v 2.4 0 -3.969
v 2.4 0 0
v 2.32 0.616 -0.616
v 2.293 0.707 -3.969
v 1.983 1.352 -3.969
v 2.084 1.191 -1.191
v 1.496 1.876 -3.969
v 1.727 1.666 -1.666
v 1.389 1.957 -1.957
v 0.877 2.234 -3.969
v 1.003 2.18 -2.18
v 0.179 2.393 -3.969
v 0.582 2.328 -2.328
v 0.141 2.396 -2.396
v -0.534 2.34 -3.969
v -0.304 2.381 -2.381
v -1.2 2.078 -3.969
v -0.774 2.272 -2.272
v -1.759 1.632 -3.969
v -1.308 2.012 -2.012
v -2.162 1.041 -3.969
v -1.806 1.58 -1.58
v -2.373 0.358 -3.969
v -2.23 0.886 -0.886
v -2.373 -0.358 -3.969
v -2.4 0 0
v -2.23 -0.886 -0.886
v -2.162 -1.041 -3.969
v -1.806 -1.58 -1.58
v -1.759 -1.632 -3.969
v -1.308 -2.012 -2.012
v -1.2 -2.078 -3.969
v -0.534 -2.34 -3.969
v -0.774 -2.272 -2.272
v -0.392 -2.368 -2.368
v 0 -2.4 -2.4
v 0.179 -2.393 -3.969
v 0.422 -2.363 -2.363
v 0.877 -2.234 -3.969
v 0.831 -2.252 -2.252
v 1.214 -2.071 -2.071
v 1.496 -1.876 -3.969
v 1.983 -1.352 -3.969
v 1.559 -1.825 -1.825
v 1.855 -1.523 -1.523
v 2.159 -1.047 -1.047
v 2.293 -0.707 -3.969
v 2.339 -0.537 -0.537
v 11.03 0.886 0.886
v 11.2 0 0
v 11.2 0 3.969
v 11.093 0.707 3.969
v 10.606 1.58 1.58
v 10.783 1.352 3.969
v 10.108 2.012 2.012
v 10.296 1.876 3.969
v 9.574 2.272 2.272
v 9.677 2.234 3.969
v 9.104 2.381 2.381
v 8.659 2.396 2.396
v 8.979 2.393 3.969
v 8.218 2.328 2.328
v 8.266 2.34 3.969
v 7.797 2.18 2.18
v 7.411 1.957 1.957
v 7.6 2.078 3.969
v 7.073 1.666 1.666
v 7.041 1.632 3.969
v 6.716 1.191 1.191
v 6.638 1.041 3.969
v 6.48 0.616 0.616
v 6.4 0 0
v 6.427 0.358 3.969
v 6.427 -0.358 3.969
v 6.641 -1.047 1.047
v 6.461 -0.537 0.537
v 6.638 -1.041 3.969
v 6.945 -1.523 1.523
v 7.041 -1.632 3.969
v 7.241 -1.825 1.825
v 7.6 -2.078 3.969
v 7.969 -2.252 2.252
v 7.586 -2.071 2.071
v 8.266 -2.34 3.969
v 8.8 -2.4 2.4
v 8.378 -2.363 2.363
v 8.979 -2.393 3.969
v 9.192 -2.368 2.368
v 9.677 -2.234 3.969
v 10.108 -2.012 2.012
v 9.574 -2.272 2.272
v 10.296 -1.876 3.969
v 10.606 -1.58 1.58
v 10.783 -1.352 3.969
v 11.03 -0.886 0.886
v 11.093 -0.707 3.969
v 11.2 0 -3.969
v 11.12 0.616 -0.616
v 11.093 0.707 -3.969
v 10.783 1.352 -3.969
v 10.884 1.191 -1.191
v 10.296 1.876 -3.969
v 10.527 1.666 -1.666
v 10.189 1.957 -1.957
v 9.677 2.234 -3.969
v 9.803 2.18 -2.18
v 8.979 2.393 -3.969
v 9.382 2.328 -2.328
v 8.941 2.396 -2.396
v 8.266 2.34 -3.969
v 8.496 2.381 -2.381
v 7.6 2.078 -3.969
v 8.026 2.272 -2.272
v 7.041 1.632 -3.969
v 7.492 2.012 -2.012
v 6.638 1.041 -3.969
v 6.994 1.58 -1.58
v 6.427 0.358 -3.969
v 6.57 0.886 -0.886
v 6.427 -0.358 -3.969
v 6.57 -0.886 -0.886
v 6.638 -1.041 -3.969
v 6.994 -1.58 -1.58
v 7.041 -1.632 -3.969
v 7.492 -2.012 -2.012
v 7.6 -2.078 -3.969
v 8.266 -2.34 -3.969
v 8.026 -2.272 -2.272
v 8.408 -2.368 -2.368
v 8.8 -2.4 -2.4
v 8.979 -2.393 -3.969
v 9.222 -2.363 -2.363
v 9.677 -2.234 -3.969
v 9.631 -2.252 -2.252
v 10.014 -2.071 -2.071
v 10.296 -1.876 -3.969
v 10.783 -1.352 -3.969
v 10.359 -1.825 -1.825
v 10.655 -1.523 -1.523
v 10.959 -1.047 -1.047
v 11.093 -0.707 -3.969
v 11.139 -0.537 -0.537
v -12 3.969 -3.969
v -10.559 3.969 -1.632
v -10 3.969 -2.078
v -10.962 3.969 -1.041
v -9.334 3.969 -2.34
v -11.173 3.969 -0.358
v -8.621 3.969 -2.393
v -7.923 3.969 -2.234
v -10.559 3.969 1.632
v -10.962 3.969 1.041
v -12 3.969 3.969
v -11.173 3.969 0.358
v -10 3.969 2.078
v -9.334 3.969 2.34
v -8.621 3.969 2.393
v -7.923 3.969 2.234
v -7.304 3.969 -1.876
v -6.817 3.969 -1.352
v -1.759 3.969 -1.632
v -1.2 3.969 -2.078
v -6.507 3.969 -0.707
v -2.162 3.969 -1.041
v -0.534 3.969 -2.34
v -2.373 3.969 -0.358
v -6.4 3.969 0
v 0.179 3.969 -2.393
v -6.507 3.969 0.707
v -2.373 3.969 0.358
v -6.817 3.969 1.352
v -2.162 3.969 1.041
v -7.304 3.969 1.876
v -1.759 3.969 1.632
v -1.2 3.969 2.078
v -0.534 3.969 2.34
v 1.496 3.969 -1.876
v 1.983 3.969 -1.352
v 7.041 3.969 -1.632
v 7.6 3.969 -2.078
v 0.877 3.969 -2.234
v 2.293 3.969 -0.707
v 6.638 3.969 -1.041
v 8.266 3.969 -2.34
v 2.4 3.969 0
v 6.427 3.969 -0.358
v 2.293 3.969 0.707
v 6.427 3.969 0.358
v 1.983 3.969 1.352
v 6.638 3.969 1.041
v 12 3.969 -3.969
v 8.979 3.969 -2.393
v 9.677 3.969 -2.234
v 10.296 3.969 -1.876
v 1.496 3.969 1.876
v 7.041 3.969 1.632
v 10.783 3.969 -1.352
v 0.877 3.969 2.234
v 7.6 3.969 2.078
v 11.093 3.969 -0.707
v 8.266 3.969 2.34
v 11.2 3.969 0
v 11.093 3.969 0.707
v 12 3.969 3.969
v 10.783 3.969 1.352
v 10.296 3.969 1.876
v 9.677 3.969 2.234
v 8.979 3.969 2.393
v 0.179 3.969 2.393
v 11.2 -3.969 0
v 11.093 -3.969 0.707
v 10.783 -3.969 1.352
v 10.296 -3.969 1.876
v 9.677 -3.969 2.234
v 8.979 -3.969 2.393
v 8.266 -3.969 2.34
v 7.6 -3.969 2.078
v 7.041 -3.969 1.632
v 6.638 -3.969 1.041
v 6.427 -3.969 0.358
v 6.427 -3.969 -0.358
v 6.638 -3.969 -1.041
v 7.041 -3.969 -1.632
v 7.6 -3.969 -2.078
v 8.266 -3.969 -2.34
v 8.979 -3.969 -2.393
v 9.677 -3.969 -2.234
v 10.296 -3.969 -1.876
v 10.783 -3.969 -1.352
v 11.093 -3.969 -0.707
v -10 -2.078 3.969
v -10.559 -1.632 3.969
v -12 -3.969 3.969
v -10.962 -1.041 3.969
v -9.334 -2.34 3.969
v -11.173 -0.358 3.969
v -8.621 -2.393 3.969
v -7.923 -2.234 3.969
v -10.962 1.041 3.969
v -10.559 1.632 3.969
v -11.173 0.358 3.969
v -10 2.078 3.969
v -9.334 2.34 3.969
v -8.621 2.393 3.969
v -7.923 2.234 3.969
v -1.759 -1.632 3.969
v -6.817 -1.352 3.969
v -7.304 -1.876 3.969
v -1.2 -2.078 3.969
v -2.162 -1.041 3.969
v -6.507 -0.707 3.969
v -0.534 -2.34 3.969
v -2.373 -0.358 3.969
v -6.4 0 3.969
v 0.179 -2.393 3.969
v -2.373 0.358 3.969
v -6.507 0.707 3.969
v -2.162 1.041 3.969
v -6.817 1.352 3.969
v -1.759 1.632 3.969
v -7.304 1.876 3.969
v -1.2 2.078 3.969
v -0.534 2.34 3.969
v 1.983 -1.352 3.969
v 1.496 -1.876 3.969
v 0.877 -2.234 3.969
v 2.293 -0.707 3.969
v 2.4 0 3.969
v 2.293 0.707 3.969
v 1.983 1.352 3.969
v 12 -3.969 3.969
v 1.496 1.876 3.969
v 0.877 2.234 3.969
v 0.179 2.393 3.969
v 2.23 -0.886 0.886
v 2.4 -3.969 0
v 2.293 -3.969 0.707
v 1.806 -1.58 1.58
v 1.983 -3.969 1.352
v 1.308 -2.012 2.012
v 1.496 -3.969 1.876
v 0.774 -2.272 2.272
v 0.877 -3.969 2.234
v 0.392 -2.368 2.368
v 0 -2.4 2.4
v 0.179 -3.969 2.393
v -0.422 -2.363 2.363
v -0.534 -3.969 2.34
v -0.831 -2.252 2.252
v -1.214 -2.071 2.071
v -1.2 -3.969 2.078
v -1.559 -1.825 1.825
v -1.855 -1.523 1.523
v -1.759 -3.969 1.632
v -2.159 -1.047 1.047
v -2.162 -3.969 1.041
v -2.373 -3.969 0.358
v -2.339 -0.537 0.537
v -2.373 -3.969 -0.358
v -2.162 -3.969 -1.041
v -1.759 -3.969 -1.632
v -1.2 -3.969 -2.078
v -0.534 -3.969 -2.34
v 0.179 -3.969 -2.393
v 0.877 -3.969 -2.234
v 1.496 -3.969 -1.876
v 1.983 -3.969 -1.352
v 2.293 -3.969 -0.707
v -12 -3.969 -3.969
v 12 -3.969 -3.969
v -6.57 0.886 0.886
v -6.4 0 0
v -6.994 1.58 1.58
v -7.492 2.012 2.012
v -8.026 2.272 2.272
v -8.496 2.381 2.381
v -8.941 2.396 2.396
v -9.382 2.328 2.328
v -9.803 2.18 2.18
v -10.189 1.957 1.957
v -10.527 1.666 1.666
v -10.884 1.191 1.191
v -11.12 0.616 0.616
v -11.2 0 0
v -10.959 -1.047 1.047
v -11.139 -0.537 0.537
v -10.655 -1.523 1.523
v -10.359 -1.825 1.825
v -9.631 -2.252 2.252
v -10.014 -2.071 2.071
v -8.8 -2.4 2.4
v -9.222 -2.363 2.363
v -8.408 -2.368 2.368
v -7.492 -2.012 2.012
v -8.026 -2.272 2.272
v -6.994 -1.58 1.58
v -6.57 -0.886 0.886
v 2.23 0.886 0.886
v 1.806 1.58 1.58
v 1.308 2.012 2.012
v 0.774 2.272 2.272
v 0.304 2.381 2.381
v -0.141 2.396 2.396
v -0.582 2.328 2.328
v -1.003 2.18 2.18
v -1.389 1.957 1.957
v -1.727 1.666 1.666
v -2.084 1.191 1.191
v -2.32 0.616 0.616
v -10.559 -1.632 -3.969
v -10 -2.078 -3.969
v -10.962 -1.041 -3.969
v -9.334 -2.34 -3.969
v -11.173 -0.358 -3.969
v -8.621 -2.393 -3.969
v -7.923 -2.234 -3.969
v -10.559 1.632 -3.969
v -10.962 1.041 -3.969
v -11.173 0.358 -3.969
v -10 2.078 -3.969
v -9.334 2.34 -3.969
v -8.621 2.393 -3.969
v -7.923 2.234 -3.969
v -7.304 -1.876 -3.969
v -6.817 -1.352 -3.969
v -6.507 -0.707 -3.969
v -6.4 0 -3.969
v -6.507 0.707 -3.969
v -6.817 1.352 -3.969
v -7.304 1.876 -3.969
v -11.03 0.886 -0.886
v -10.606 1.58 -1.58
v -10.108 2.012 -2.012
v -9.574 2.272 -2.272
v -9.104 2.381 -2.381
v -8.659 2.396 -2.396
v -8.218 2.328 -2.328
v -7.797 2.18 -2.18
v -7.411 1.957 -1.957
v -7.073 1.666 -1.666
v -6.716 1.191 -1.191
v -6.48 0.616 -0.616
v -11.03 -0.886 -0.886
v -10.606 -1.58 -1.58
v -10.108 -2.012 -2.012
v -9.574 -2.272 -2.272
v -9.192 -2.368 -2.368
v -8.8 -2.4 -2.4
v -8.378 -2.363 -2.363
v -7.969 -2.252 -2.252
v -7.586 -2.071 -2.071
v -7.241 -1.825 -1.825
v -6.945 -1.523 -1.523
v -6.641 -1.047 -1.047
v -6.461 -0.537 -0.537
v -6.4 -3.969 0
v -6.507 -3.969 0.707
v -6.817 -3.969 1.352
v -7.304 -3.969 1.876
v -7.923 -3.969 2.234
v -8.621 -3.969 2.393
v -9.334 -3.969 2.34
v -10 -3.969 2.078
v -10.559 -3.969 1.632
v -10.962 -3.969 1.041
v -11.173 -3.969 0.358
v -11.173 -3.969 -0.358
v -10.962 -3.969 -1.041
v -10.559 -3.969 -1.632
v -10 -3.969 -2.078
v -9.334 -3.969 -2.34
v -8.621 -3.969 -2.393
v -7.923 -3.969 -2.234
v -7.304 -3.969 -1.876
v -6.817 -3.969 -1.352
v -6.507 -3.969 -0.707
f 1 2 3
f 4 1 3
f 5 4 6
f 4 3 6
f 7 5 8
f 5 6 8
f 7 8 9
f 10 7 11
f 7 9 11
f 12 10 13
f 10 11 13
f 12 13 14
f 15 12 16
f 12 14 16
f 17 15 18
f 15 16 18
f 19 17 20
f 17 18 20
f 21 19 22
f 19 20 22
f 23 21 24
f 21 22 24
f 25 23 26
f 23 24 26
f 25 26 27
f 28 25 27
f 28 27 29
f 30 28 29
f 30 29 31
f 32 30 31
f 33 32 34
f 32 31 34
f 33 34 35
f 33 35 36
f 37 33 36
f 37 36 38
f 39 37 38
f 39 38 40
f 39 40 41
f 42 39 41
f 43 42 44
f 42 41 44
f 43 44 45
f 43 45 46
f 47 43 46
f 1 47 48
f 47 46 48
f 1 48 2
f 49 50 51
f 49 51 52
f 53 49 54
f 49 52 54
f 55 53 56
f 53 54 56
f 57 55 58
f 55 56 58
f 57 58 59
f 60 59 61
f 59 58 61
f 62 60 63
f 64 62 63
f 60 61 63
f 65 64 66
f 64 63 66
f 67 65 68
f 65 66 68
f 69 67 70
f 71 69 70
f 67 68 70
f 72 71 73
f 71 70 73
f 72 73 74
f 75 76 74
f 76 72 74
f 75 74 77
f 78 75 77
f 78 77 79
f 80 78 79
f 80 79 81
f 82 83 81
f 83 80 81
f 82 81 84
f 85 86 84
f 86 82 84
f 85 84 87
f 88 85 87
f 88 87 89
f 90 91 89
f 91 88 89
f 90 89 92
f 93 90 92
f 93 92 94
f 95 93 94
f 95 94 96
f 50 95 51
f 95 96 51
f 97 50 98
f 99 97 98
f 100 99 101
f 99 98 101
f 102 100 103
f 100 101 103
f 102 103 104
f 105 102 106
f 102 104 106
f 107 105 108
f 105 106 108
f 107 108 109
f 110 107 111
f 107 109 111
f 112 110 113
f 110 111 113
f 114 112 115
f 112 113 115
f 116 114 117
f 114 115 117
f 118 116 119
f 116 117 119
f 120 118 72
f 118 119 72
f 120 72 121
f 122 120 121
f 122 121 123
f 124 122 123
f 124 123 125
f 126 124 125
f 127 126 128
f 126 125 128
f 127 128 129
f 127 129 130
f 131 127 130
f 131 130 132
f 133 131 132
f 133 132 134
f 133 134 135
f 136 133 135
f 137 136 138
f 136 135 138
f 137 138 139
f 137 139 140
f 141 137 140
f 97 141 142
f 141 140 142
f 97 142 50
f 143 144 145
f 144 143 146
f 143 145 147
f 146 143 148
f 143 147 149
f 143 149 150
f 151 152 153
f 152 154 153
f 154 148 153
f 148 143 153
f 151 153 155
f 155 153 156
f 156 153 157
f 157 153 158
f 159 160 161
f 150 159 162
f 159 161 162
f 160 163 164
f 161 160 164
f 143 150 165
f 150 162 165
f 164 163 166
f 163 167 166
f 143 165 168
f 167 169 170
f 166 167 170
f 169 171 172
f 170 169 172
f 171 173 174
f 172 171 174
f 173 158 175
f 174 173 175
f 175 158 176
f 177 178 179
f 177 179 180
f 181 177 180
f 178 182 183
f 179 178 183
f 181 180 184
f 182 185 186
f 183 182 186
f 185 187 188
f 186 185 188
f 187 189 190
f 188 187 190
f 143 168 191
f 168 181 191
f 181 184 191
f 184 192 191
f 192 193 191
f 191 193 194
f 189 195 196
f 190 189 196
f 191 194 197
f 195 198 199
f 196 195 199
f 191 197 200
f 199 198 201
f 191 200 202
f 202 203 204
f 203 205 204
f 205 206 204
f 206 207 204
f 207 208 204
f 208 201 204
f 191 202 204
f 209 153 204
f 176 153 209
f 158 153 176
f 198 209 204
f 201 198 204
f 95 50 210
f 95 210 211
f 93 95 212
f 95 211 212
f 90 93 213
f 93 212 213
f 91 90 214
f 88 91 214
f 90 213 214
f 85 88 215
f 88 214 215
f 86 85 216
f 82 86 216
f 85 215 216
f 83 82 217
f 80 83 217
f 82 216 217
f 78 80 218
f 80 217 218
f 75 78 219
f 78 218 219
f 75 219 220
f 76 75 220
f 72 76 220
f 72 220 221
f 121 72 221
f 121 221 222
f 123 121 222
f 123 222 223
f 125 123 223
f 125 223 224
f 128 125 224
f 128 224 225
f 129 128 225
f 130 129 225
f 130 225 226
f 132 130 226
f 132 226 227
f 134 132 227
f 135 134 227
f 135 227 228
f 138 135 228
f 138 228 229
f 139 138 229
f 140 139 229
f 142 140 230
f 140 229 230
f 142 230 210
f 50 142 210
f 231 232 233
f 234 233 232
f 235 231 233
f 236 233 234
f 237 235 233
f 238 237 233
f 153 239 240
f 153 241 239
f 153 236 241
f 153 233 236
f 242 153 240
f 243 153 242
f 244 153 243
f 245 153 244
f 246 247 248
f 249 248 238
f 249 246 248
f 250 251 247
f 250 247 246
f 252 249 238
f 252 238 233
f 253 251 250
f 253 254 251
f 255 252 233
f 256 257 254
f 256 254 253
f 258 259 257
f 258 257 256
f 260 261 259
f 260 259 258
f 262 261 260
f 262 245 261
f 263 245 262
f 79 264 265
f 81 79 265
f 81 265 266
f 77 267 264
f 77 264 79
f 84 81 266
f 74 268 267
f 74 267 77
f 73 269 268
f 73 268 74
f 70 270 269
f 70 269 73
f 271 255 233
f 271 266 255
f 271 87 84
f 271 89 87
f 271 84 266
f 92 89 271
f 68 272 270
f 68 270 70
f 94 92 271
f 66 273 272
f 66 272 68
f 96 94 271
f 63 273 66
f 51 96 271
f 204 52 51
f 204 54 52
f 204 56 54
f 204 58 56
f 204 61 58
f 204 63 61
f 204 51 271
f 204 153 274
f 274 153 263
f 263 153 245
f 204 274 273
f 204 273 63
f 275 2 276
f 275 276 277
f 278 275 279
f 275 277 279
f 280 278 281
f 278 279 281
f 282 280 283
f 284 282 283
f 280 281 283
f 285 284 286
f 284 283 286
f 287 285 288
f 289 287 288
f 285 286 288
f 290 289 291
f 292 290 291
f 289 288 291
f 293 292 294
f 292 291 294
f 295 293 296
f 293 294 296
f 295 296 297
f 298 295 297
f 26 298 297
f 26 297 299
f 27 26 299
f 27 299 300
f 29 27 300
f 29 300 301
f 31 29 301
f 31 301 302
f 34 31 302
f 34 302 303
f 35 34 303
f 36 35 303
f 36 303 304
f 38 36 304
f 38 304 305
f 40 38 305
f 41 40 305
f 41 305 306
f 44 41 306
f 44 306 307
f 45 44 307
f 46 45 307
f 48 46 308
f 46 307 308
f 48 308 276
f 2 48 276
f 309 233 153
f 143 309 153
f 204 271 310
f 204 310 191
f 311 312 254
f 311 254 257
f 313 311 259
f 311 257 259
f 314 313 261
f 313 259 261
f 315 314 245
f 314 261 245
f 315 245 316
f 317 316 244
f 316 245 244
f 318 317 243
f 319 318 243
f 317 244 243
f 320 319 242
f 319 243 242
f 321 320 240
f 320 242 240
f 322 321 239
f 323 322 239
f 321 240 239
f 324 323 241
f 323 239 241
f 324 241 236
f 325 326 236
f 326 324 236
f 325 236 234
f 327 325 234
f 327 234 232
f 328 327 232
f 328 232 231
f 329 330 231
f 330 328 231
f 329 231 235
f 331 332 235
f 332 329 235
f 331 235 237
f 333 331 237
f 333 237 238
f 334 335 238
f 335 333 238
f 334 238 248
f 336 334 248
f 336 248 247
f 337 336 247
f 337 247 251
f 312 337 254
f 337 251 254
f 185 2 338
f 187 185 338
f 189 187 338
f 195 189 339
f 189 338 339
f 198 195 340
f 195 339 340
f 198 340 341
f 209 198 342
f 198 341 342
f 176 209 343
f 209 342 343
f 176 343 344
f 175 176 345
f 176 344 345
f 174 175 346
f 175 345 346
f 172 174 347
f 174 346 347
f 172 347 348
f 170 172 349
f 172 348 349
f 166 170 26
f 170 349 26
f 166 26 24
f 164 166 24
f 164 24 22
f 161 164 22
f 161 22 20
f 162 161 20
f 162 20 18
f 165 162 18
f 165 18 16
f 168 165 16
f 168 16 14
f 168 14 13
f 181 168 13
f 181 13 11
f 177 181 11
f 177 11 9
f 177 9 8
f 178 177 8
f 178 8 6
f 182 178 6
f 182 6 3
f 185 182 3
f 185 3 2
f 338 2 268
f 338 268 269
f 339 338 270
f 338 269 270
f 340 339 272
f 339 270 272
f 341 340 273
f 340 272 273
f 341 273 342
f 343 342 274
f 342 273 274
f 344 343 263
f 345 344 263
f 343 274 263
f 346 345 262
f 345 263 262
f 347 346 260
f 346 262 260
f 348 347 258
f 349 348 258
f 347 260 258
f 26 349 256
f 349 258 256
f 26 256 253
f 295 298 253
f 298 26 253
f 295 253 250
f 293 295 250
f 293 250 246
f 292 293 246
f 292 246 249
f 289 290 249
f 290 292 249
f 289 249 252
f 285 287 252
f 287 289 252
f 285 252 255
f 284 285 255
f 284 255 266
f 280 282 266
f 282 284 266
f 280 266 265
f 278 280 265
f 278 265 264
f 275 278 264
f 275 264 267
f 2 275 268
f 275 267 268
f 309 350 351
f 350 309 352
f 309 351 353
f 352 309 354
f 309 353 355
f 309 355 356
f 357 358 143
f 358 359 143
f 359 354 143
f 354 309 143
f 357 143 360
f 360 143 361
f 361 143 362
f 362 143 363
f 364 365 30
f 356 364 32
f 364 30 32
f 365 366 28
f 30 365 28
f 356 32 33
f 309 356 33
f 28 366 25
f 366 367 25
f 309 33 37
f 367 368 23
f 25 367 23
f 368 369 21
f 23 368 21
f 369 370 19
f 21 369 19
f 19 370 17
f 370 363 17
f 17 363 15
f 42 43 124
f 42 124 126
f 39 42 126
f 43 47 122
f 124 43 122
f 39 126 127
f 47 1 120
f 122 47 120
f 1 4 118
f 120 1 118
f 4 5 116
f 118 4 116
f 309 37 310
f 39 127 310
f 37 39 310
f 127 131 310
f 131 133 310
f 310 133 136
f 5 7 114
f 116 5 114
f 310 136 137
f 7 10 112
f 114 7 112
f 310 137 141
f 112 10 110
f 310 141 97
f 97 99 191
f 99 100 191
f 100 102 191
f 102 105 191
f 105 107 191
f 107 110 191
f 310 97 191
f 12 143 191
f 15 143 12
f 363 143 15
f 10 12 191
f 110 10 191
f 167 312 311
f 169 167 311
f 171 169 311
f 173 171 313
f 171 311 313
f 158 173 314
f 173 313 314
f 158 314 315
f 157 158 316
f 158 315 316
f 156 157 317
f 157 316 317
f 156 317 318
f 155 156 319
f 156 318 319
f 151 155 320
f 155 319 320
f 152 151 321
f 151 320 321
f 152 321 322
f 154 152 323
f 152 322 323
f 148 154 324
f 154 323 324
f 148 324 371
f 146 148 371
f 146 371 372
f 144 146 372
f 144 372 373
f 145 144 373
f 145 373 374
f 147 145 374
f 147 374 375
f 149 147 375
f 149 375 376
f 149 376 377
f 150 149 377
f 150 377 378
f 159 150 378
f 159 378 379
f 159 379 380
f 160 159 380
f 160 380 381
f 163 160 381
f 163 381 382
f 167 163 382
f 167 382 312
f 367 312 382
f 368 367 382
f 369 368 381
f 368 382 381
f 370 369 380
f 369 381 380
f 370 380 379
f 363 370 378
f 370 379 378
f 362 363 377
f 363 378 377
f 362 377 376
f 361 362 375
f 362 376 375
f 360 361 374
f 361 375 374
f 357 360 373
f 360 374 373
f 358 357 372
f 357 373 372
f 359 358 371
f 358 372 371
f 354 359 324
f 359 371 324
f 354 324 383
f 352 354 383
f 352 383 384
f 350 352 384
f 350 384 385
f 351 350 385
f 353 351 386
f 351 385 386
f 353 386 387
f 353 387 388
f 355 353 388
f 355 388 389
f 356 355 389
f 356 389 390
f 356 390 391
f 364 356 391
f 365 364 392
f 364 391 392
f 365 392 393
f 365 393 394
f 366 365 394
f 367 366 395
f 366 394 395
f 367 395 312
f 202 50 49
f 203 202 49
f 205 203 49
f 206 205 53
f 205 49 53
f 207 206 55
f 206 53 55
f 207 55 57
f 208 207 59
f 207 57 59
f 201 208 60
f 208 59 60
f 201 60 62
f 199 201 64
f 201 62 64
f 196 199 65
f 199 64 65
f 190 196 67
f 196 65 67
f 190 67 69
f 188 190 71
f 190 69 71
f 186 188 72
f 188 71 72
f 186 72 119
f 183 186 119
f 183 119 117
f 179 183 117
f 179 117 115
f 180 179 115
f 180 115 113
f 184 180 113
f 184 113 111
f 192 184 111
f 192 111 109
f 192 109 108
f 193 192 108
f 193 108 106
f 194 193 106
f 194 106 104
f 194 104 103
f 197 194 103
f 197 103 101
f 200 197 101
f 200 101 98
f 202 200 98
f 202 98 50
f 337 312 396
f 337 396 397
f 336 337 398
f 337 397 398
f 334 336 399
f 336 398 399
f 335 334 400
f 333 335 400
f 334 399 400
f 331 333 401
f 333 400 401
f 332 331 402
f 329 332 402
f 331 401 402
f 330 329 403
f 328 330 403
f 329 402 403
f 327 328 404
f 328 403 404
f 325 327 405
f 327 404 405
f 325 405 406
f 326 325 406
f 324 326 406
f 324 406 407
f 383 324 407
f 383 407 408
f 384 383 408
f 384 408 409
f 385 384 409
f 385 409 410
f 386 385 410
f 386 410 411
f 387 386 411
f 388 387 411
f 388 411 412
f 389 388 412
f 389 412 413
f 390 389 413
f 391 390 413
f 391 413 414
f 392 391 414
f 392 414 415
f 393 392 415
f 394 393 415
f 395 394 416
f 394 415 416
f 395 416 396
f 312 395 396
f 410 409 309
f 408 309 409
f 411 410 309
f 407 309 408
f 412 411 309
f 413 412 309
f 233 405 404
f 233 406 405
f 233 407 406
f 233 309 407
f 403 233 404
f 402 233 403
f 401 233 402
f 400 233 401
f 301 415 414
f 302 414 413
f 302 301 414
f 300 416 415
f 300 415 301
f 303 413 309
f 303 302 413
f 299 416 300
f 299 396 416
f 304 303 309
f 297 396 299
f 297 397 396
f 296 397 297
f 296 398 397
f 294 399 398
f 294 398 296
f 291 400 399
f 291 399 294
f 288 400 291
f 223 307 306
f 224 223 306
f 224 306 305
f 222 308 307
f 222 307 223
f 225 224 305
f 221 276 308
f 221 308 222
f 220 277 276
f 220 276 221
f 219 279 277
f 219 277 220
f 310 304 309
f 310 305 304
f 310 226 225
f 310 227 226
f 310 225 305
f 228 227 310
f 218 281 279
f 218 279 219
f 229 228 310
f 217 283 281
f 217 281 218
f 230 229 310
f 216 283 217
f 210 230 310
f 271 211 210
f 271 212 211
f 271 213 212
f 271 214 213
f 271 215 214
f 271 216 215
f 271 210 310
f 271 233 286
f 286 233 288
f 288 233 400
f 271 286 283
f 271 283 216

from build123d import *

# Parameters (mm, degrees)
F0_W     = 24
F0_H     = 7.9375
F1_DEPTH = 3.96875
F2_R     = 2.4
F3_DEPTH = 7.9385
F4_R     = 2.4
F5_DEPTH = 7.9385


with BuildPart() as f1:
    # F0 (on Top) → F1 (new body, symmetric)
    with BuildSketch(Plane.XY):
        Rectangle(F0_W, F0_H)
    extrude(amount=F1_DEPTH, both=True)

    # F2 (on face) → F3 (cut, through all)
    with BuildSketch(Plane.XZ.offset(3.96875)):
        Circle(F2_R)
        with Locations((8.8, 0)):
            Circle(F2_R)
        with Locations((-8.8, 0)):
            Circle(F2_R)
    extrude(amount=-F3_DEPTH, mode=Mode.SUBTRACT)

    # F4 (on face) → F5 (cut, through all)
    with BuildSketch(Plane.XY.offset(3.96875)):
        Circle(F4_R)
        with Locations((8.8, 0)):
            Circle(F4_R)
        with Locations((-8.8, 0)):
            Circle(F4_R)
    extrude(amount=-F5_DEPTH, mode=Mode.SUBTRACT)


solid = f1.part
